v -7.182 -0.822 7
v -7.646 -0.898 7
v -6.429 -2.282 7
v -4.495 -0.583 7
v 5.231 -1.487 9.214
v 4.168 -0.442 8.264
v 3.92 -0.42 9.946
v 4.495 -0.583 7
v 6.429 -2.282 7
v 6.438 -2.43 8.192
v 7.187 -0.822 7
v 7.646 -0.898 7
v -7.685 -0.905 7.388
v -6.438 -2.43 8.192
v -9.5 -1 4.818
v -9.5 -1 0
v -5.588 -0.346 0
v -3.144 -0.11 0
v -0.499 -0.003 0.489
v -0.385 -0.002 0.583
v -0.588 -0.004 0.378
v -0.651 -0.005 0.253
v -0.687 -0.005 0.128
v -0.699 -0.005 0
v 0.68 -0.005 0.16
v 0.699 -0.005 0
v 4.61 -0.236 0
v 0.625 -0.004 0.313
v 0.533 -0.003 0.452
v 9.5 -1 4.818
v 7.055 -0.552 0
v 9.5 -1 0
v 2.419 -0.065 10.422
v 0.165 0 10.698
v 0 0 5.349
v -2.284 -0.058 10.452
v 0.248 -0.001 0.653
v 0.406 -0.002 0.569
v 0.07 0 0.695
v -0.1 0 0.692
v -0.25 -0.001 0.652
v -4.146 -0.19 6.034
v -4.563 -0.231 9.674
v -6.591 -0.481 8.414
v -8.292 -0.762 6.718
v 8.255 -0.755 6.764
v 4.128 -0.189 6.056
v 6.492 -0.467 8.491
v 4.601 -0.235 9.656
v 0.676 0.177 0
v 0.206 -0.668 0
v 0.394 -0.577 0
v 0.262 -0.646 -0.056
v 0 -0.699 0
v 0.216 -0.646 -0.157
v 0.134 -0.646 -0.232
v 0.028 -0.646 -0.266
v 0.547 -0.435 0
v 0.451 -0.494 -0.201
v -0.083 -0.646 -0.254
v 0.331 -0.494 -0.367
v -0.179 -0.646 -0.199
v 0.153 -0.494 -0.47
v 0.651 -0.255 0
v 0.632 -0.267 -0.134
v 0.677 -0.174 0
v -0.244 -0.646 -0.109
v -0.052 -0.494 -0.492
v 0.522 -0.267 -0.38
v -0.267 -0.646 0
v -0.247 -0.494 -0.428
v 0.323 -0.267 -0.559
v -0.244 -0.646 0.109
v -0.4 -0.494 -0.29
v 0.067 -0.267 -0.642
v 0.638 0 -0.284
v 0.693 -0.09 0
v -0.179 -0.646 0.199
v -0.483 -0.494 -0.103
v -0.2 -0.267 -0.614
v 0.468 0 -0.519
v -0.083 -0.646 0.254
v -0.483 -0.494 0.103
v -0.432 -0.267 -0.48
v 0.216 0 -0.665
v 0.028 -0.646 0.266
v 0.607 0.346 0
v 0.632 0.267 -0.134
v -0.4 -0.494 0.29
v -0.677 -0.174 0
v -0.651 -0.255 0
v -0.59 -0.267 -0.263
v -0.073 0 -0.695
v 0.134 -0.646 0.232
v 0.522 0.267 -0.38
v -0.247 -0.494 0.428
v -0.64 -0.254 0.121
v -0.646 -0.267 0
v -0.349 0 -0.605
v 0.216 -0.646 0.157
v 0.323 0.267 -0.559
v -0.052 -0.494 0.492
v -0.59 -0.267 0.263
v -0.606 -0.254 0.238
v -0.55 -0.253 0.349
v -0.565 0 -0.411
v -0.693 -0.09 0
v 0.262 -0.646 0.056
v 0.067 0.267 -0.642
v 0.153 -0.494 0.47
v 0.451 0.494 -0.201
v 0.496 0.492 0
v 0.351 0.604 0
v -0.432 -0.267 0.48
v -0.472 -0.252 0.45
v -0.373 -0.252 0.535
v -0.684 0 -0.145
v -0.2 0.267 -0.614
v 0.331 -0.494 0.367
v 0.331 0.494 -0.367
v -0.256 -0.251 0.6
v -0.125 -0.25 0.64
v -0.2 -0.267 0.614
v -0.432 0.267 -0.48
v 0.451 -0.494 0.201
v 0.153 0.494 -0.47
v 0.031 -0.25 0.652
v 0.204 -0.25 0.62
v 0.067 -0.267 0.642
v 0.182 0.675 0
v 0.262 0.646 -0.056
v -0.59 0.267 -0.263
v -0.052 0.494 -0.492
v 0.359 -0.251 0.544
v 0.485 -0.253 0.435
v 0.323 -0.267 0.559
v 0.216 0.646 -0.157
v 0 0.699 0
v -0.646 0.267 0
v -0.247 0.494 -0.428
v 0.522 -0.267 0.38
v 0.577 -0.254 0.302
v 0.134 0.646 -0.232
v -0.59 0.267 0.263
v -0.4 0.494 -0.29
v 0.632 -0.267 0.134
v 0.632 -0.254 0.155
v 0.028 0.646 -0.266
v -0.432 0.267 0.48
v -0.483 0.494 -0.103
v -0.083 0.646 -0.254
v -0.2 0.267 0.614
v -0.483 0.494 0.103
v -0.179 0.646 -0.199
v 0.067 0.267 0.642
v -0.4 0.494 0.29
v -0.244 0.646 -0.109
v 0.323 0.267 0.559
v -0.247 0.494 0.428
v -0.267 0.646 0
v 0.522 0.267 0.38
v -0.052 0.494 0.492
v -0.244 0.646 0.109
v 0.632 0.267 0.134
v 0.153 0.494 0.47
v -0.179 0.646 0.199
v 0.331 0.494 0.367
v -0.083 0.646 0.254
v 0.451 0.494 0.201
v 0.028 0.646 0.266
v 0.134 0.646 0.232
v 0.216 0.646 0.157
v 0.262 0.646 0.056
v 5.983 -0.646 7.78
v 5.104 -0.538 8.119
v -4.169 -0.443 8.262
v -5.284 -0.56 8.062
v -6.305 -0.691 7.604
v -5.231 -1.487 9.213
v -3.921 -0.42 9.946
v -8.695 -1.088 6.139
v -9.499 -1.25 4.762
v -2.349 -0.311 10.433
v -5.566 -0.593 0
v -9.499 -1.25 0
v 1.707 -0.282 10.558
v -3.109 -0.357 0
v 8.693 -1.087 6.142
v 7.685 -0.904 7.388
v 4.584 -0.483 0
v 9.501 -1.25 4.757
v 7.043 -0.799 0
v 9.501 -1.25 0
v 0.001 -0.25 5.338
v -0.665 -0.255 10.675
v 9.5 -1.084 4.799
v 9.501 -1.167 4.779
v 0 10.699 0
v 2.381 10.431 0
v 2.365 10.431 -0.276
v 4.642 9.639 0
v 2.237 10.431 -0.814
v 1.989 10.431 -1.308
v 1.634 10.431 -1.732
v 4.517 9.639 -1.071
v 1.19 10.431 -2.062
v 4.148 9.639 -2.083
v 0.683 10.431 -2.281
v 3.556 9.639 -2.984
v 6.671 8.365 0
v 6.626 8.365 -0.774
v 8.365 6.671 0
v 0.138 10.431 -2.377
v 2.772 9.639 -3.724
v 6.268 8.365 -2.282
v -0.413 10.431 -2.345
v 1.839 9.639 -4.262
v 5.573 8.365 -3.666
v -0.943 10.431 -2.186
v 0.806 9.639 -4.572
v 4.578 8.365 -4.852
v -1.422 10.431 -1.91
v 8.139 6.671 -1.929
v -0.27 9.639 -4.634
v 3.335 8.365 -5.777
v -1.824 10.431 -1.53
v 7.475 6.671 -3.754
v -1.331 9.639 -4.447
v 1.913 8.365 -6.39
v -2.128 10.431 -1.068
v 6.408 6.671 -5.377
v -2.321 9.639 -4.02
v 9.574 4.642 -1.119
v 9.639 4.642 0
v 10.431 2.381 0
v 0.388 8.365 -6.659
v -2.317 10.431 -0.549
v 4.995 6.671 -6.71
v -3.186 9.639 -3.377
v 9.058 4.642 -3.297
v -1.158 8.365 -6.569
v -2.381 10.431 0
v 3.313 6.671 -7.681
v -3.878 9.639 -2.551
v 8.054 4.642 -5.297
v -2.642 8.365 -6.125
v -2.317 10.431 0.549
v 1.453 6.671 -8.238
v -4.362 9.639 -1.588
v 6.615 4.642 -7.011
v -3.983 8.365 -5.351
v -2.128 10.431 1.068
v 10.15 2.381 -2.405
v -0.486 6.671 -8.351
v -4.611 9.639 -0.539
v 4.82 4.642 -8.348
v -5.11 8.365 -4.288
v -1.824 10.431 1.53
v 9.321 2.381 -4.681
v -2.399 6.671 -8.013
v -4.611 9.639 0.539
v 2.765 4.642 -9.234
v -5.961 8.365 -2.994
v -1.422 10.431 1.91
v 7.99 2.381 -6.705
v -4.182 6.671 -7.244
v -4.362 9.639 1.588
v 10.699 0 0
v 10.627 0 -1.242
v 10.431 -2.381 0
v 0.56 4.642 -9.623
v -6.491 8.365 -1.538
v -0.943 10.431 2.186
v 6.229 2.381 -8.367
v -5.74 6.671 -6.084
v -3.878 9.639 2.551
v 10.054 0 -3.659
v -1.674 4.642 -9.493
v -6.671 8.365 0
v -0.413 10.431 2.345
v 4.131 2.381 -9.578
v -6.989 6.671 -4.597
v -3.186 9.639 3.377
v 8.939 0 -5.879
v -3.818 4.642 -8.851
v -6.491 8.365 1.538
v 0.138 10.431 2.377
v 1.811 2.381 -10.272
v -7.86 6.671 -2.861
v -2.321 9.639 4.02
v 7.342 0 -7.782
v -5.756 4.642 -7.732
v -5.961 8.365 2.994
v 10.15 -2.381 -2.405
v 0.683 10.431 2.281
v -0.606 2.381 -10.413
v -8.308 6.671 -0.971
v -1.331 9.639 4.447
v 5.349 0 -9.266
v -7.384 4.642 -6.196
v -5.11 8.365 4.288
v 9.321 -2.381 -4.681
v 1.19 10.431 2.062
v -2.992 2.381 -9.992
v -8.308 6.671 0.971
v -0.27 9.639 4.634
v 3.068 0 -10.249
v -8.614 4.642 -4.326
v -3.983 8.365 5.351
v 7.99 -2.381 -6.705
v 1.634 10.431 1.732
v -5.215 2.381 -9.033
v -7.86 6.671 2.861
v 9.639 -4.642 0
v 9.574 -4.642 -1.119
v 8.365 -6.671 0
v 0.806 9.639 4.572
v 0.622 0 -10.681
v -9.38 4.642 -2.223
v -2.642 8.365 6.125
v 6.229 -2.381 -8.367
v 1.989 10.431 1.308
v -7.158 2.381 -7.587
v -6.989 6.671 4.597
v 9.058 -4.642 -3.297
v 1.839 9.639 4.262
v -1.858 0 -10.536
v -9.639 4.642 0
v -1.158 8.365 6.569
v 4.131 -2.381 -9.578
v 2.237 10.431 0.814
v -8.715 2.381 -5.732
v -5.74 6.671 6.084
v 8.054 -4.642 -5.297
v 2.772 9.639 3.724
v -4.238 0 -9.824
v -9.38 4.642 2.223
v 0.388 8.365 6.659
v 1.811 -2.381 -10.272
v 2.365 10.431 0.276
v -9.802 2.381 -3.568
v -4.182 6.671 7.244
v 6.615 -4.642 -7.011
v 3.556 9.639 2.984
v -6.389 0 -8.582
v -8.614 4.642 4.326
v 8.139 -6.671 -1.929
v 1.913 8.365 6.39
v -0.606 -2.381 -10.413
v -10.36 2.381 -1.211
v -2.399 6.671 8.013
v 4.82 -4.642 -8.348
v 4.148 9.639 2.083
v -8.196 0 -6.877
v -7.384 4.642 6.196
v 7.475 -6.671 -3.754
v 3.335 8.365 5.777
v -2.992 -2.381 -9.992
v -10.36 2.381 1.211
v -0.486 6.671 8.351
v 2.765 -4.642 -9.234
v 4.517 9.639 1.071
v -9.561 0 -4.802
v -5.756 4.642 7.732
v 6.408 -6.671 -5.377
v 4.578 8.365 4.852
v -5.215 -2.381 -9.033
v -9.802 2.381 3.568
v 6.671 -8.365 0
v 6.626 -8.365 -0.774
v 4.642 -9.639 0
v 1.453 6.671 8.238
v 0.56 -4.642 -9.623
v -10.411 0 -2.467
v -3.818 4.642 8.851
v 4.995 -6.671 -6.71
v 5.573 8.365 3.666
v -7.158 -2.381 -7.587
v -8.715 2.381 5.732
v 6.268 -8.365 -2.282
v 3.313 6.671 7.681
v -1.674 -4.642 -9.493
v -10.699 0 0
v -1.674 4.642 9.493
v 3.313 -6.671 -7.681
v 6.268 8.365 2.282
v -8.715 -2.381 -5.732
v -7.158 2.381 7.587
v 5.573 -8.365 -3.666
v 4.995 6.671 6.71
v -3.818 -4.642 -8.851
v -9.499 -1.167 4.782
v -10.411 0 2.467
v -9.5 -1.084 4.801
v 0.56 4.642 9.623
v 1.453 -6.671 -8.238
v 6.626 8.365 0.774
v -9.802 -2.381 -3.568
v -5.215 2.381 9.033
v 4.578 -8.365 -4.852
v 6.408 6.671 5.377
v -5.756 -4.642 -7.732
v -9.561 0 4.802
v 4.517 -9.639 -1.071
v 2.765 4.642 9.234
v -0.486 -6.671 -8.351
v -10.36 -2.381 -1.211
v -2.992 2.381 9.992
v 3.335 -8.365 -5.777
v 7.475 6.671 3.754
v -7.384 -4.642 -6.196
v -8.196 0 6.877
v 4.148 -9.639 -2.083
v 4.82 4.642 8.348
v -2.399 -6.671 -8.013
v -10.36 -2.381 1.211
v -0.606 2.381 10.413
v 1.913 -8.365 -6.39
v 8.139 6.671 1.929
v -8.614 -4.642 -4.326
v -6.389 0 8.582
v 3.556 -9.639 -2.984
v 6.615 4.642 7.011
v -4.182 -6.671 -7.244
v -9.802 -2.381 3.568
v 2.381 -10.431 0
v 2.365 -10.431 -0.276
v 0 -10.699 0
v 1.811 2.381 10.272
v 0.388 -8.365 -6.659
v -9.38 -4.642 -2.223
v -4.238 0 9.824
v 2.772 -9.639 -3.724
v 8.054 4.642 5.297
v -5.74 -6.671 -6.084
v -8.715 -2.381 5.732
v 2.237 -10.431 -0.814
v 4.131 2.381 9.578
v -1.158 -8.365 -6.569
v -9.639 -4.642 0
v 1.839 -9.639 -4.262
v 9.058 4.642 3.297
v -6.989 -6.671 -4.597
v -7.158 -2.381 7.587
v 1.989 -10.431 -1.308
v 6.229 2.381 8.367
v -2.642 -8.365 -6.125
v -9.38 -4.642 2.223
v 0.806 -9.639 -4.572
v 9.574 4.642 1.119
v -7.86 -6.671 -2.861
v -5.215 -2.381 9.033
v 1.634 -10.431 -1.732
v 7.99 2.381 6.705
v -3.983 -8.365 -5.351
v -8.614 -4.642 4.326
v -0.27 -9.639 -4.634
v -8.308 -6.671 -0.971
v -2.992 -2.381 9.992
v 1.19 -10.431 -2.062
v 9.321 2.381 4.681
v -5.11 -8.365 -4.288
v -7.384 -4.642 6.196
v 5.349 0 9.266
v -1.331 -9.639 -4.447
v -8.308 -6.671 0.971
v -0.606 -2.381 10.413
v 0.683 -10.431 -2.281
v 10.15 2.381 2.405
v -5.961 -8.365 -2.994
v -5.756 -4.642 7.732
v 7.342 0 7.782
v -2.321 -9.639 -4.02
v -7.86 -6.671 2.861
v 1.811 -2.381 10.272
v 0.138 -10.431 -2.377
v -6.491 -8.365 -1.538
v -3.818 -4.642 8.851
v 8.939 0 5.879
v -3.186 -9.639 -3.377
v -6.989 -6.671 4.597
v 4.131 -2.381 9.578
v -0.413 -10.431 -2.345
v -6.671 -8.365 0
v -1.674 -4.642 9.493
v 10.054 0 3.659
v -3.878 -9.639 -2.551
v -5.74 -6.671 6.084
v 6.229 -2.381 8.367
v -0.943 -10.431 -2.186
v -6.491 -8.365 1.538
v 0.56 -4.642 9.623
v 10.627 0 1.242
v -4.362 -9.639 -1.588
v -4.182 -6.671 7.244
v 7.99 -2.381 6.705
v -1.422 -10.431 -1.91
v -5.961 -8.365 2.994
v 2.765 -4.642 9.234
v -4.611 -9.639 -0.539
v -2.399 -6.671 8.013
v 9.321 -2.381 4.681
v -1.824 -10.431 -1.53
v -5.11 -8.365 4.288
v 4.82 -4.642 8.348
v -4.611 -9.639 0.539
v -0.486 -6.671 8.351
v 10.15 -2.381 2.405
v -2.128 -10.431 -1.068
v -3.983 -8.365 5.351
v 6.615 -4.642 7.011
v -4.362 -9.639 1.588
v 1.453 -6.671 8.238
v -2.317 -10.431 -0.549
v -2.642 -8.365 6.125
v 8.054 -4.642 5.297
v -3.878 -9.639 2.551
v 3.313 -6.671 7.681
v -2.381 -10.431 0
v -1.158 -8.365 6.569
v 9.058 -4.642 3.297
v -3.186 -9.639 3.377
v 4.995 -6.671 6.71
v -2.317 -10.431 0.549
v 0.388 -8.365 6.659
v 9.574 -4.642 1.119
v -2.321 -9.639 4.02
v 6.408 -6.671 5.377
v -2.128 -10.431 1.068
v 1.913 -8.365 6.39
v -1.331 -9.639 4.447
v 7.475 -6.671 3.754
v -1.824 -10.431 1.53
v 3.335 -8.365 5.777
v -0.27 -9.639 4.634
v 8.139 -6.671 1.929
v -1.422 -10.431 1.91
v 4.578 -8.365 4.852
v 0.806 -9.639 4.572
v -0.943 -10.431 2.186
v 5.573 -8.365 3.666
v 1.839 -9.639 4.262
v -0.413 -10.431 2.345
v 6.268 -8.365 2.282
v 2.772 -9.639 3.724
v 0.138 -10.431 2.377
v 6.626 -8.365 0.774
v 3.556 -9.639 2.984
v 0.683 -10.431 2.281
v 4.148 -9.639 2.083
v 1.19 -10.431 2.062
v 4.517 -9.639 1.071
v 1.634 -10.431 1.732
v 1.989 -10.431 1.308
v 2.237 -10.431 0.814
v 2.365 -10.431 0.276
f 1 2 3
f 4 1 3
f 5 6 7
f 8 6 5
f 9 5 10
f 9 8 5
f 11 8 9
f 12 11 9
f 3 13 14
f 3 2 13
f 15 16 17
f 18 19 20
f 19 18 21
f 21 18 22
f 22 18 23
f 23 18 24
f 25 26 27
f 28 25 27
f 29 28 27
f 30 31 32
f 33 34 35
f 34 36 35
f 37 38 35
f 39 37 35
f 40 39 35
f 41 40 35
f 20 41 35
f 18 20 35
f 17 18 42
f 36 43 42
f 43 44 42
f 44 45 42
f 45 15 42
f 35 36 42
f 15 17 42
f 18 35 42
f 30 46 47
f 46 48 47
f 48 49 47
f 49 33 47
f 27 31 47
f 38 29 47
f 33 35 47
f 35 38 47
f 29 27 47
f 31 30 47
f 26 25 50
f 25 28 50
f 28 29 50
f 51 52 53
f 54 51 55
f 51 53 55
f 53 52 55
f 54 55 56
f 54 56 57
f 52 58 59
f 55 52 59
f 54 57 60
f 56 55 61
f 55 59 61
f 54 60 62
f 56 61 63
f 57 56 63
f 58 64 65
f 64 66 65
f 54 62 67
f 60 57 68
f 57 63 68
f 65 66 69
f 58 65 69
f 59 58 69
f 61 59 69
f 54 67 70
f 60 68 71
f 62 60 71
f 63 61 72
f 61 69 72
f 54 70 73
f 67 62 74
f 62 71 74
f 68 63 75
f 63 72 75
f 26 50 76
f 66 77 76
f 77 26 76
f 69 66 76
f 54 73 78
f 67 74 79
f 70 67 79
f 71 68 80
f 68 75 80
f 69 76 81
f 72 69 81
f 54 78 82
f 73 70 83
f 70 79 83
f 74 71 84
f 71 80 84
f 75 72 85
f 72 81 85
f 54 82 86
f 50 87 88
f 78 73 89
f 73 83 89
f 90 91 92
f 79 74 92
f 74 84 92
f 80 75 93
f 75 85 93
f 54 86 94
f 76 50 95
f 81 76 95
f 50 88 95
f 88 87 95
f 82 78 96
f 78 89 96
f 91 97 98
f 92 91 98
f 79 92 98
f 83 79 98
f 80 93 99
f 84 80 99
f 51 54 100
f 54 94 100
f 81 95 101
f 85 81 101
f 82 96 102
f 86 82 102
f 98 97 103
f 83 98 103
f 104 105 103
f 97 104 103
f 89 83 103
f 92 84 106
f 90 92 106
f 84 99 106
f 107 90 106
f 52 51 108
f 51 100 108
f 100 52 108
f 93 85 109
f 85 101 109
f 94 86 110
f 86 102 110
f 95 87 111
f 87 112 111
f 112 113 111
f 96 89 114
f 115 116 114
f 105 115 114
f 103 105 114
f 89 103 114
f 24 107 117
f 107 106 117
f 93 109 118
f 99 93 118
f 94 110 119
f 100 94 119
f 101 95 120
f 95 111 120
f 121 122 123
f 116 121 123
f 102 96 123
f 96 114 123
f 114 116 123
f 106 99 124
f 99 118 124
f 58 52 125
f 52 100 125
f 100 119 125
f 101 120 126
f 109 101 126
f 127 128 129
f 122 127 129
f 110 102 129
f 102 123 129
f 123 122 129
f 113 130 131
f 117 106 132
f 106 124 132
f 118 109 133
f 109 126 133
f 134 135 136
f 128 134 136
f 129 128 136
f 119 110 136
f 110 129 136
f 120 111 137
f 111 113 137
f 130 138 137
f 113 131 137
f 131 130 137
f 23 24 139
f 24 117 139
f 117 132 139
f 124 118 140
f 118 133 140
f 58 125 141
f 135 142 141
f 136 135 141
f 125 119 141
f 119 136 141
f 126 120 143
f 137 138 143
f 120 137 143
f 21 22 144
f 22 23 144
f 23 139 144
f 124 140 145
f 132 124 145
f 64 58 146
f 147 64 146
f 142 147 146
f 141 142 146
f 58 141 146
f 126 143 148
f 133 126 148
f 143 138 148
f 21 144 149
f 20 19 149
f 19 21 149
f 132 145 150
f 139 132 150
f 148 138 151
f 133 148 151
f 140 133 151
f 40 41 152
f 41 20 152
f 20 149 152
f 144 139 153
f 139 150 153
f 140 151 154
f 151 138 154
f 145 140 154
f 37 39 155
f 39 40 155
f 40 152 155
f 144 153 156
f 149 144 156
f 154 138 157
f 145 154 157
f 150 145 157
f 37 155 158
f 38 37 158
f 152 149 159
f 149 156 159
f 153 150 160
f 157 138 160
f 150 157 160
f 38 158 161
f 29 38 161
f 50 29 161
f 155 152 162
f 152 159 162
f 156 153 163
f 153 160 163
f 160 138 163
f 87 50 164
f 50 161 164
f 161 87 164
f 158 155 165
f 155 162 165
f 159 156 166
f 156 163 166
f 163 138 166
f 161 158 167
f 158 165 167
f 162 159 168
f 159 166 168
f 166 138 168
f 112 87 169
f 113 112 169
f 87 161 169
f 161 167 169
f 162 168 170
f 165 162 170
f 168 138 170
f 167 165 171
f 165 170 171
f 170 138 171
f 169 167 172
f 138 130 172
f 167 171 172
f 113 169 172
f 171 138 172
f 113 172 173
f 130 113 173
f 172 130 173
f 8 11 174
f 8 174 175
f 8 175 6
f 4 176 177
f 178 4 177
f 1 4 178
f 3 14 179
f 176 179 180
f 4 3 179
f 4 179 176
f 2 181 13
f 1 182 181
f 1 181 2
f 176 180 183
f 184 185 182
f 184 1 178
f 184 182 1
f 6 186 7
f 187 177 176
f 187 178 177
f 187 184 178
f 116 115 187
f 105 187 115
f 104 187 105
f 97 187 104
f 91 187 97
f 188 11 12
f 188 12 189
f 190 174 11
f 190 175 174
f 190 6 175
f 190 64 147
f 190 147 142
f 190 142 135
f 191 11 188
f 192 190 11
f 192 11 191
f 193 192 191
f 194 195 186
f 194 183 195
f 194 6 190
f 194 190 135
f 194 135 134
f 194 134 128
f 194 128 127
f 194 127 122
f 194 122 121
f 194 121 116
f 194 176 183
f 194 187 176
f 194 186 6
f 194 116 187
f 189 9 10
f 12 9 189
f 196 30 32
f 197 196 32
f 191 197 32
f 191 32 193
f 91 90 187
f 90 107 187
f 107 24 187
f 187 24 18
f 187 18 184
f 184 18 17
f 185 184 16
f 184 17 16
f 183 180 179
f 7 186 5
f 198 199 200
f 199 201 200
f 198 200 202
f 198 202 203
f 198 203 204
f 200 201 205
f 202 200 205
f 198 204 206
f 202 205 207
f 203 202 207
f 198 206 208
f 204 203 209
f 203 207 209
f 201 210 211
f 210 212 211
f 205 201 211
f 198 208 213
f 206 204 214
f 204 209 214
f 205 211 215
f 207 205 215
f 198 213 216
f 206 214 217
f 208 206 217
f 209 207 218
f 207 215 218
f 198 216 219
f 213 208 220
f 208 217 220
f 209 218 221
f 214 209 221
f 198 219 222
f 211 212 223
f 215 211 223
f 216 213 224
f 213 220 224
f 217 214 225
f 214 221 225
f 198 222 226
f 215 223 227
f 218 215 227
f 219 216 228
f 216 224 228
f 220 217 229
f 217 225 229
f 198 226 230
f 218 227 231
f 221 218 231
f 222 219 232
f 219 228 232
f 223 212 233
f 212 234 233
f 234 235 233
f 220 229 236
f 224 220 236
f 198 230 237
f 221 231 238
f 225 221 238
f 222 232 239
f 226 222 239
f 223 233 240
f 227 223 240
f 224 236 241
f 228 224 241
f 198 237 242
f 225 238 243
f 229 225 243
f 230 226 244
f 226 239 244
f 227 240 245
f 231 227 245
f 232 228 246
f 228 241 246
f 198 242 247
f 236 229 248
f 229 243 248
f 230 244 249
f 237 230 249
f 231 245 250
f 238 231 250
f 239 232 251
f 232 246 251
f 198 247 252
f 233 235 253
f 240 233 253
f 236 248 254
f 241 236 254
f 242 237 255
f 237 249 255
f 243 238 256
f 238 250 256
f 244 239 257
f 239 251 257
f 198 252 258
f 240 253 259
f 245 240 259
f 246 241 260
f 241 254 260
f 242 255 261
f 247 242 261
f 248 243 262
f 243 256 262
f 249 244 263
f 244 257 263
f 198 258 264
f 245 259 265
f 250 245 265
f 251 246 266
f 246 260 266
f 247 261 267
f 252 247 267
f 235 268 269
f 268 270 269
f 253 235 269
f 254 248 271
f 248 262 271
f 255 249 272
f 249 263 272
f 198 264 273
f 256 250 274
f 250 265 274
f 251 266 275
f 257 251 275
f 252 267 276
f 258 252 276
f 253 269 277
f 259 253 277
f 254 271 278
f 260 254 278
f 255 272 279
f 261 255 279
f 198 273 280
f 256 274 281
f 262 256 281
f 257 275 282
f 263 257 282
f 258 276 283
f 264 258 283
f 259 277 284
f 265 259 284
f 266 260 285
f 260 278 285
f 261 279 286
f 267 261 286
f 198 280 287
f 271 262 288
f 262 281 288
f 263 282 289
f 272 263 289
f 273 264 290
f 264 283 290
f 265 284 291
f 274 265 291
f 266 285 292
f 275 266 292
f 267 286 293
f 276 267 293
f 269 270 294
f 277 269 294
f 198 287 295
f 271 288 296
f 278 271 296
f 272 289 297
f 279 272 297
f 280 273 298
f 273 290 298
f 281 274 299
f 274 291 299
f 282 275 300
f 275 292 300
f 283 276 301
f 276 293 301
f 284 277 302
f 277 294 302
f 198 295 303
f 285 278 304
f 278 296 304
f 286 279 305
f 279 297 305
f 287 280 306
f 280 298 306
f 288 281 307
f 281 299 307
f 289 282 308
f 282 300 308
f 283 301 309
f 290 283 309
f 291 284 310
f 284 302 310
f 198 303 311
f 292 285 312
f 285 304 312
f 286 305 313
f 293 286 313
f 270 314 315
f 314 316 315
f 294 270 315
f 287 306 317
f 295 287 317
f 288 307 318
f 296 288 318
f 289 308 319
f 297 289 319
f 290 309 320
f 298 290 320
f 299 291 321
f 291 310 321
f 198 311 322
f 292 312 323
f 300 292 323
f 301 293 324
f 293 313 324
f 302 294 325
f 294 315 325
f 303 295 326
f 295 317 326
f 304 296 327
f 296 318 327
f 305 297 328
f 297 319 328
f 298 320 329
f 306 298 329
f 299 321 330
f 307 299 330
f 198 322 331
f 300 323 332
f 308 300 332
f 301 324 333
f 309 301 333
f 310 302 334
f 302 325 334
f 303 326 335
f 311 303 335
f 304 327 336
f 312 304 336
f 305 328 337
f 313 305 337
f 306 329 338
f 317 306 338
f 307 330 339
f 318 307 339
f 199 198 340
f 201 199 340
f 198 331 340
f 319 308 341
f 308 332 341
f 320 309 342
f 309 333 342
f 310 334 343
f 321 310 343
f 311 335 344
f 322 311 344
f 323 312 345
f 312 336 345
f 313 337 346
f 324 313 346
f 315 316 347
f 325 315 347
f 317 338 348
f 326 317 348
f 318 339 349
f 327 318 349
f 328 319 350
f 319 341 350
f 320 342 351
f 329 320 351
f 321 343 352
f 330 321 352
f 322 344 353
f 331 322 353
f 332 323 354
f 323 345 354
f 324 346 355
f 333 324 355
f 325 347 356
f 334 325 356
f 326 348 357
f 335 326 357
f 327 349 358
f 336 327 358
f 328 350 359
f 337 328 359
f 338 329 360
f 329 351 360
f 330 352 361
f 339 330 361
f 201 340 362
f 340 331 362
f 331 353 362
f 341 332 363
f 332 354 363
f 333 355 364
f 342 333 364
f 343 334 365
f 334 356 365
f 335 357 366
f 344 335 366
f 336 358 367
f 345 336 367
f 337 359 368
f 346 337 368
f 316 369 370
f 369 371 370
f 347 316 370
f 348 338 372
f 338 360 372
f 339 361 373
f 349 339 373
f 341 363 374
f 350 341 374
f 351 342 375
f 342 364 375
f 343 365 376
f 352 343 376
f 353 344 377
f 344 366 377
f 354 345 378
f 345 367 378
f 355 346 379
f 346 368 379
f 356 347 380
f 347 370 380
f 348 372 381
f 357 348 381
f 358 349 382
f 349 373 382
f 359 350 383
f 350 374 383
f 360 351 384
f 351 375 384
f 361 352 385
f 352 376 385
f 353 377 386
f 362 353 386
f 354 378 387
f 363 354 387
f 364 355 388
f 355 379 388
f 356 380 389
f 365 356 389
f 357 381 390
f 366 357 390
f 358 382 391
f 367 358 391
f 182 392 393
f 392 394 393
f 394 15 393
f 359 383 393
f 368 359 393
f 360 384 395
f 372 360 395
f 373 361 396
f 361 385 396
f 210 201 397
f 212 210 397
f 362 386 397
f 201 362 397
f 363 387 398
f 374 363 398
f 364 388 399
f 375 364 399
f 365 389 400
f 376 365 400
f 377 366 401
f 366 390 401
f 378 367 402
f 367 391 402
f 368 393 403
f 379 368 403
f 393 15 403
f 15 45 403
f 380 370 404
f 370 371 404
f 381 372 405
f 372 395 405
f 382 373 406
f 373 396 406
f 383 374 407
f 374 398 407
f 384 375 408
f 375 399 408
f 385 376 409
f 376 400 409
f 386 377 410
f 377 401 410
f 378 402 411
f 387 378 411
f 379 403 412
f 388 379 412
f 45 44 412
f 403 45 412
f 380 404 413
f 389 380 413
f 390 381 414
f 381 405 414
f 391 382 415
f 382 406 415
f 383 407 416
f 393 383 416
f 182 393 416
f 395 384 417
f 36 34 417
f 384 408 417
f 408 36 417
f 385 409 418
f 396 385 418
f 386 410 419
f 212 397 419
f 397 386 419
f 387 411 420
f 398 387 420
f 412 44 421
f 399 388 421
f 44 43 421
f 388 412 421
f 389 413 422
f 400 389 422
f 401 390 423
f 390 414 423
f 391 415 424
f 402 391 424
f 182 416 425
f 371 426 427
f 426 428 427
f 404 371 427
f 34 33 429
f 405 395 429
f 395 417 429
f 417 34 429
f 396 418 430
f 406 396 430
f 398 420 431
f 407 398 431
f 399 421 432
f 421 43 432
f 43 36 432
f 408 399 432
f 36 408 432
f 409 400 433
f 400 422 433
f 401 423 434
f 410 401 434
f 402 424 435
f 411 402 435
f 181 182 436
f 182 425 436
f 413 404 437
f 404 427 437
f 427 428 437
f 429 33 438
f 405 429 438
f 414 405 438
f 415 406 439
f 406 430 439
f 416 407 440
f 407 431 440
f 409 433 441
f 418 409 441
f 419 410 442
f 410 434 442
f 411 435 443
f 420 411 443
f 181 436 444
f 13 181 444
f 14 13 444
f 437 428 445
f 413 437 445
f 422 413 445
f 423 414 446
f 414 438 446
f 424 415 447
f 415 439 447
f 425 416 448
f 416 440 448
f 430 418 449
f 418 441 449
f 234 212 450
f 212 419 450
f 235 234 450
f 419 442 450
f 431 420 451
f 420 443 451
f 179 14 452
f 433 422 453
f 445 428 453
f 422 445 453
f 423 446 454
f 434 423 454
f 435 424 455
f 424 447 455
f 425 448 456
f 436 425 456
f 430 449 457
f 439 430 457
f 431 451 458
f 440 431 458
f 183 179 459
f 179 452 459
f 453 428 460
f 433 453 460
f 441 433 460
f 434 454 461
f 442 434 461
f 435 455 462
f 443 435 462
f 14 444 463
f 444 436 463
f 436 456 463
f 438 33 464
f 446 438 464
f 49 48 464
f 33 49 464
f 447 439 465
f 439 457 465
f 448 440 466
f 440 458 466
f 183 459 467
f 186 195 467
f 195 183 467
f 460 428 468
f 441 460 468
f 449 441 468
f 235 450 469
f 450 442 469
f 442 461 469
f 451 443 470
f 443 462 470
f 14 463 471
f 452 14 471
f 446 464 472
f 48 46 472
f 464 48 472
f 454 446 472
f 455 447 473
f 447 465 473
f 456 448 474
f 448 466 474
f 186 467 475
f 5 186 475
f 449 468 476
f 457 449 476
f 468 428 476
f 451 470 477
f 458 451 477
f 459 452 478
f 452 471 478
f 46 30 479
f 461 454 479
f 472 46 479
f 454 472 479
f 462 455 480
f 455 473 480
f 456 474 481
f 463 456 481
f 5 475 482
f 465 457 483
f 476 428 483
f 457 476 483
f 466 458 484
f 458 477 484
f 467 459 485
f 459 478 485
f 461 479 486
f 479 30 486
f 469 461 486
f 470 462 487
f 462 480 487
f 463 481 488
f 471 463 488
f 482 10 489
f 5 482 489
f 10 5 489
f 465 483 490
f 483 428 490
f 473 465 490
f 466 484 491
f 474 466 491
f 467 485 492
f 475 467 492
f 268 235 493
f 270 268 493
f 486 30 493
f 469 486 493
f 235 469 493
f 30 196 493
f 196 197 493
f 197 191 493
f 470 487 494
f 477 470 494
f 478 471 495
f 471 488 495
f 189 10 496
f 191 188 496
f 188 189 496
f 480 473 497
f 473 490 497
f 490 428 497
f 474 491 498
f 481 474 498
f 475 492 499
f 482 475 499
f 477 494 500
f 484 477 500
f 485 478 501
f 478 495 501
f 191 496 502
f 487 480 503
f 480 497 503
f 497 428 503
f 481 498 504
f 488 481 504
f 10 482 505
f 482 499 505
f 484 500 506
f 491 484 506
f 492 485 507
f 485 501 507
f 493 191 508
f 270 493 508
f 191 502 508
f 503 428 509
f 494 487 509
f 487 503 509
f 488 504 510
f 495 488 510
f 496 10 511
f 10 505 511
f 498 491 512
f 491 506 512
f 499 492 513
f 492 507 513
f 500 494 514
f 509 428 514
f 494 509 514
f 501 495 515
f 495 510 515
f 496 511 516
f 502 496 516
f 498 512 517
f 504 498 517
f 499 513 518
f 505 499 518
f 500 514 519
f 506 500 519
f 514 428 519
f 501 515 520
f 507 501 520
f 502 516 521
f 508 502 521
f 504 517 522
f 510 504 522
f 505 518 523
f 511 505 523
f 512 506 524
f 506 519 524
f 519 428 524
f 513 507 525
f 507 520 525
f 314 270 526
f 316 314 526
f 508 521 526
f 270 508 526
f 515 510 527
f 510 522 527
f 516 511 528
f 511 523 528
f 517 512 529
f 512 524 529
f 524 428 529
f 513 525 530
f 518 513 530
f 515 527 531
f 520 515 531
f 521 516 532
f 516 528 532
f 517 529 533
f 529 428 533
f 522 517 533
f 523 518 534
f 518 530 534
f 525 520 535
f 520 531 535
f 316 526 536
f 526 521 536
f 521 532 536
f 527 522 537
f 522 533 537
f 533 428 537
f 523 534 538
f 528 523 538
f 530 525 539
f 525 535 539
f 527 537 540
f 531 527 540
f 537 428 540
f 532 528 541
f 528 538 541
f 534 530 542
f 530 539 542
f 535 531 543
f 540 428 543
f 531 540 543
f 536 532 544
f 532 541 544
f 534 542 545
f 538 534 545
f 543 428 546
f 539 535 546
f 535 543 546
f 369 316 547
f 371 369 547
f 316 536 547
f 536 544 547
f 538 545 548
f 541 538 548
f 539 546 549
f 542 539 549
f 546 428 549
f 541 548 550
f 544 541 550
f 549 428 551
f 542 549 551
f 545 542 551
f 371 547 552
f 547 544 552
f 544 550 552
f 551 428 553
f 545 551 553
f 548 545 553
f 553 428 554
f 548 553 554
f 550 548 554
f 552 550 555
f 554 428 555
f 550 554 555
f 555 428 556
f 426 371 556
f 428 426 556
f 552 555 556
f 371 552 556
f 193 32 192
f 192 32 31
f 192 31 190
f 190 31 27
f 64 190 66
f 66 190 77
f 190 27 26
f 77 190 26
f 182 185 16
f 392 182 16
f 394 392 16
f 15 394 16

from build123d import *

# Parameters (mm, degrees)
ENL_V_MAT_EXTRU_2_DEPTH = 11.698916896
ENL_V_MAT_EXTRU_4_DEPTH = 3
ENL_V_MAT_EXTRU_4_TAPER = 5


with BuildPart() as part:
    # Esquisse1 → Révol.-Mince1 (revolve)
    with BuildSketch(Plane.XY):
        with BuildLine():
            ThreePointArc((0, 10.698916896), (10.698916896, 0), (0, -10.698916896))
            Line((0, -10.698916896), (0, -0.698916896))
            ThreePointArc((0, -0.698916896), (0.698916896, 0), (0, 0.698916896))
            Line((0, 0.698916896), (0, 10.698916896))
        make_face()
    revolve(axis=Axis((0, -3.545926921, 0), (0, 1, 0)))

    # Esquisse2 → Enlèv. mat.-Extru.2 (cut, through all)
    with BuildSketch(Plane.XY):
        with BuildLine():
            Line((-9.498856237, -1.25), (-9.5, -1))
            add(Edge.make_bspline(
                [(-9.5, -1), (0, 1), (9.5, -1)],
                knots=[0, 0, 0, 1, 1, 1], degree=2))
            Line((9.5, -1), (9.501143763, -1.25))
            add(Edge.make_bspline(
                [(-9.498856237, -1.25), (0.001143763, 0.750101861), (9.501143763, -1.25)],
                knots=[0, 0, 0, 1, 1, 1], degree=2))
        make_face()
    extrude(amount=ENL_V_MAT_EXTRU_2_DEPTH, mode=Mode.SUBTRACT)

    # Esquisse4 → Enlèv. mat.-Extru.4 (cut)
    with BuildSketch(Plane.XY.offset(10)):
        Polygon((3.719730148, -0.25), (6.452328662, -2.65272264), (8.21328513, -0.65), align=None)
        Polygon((-6.452328662, -2.65272264), (-3.719730148, -0.25), (-8.21328513, -0.65), align=None)
    extrude(amount=-ENL_V_MAT_EXTRU_4_DEPTH, taper=ENL_V_MAT_EXTRU_4_TAPER, mode=Mode.SUBTRACT)


solid = part.part
